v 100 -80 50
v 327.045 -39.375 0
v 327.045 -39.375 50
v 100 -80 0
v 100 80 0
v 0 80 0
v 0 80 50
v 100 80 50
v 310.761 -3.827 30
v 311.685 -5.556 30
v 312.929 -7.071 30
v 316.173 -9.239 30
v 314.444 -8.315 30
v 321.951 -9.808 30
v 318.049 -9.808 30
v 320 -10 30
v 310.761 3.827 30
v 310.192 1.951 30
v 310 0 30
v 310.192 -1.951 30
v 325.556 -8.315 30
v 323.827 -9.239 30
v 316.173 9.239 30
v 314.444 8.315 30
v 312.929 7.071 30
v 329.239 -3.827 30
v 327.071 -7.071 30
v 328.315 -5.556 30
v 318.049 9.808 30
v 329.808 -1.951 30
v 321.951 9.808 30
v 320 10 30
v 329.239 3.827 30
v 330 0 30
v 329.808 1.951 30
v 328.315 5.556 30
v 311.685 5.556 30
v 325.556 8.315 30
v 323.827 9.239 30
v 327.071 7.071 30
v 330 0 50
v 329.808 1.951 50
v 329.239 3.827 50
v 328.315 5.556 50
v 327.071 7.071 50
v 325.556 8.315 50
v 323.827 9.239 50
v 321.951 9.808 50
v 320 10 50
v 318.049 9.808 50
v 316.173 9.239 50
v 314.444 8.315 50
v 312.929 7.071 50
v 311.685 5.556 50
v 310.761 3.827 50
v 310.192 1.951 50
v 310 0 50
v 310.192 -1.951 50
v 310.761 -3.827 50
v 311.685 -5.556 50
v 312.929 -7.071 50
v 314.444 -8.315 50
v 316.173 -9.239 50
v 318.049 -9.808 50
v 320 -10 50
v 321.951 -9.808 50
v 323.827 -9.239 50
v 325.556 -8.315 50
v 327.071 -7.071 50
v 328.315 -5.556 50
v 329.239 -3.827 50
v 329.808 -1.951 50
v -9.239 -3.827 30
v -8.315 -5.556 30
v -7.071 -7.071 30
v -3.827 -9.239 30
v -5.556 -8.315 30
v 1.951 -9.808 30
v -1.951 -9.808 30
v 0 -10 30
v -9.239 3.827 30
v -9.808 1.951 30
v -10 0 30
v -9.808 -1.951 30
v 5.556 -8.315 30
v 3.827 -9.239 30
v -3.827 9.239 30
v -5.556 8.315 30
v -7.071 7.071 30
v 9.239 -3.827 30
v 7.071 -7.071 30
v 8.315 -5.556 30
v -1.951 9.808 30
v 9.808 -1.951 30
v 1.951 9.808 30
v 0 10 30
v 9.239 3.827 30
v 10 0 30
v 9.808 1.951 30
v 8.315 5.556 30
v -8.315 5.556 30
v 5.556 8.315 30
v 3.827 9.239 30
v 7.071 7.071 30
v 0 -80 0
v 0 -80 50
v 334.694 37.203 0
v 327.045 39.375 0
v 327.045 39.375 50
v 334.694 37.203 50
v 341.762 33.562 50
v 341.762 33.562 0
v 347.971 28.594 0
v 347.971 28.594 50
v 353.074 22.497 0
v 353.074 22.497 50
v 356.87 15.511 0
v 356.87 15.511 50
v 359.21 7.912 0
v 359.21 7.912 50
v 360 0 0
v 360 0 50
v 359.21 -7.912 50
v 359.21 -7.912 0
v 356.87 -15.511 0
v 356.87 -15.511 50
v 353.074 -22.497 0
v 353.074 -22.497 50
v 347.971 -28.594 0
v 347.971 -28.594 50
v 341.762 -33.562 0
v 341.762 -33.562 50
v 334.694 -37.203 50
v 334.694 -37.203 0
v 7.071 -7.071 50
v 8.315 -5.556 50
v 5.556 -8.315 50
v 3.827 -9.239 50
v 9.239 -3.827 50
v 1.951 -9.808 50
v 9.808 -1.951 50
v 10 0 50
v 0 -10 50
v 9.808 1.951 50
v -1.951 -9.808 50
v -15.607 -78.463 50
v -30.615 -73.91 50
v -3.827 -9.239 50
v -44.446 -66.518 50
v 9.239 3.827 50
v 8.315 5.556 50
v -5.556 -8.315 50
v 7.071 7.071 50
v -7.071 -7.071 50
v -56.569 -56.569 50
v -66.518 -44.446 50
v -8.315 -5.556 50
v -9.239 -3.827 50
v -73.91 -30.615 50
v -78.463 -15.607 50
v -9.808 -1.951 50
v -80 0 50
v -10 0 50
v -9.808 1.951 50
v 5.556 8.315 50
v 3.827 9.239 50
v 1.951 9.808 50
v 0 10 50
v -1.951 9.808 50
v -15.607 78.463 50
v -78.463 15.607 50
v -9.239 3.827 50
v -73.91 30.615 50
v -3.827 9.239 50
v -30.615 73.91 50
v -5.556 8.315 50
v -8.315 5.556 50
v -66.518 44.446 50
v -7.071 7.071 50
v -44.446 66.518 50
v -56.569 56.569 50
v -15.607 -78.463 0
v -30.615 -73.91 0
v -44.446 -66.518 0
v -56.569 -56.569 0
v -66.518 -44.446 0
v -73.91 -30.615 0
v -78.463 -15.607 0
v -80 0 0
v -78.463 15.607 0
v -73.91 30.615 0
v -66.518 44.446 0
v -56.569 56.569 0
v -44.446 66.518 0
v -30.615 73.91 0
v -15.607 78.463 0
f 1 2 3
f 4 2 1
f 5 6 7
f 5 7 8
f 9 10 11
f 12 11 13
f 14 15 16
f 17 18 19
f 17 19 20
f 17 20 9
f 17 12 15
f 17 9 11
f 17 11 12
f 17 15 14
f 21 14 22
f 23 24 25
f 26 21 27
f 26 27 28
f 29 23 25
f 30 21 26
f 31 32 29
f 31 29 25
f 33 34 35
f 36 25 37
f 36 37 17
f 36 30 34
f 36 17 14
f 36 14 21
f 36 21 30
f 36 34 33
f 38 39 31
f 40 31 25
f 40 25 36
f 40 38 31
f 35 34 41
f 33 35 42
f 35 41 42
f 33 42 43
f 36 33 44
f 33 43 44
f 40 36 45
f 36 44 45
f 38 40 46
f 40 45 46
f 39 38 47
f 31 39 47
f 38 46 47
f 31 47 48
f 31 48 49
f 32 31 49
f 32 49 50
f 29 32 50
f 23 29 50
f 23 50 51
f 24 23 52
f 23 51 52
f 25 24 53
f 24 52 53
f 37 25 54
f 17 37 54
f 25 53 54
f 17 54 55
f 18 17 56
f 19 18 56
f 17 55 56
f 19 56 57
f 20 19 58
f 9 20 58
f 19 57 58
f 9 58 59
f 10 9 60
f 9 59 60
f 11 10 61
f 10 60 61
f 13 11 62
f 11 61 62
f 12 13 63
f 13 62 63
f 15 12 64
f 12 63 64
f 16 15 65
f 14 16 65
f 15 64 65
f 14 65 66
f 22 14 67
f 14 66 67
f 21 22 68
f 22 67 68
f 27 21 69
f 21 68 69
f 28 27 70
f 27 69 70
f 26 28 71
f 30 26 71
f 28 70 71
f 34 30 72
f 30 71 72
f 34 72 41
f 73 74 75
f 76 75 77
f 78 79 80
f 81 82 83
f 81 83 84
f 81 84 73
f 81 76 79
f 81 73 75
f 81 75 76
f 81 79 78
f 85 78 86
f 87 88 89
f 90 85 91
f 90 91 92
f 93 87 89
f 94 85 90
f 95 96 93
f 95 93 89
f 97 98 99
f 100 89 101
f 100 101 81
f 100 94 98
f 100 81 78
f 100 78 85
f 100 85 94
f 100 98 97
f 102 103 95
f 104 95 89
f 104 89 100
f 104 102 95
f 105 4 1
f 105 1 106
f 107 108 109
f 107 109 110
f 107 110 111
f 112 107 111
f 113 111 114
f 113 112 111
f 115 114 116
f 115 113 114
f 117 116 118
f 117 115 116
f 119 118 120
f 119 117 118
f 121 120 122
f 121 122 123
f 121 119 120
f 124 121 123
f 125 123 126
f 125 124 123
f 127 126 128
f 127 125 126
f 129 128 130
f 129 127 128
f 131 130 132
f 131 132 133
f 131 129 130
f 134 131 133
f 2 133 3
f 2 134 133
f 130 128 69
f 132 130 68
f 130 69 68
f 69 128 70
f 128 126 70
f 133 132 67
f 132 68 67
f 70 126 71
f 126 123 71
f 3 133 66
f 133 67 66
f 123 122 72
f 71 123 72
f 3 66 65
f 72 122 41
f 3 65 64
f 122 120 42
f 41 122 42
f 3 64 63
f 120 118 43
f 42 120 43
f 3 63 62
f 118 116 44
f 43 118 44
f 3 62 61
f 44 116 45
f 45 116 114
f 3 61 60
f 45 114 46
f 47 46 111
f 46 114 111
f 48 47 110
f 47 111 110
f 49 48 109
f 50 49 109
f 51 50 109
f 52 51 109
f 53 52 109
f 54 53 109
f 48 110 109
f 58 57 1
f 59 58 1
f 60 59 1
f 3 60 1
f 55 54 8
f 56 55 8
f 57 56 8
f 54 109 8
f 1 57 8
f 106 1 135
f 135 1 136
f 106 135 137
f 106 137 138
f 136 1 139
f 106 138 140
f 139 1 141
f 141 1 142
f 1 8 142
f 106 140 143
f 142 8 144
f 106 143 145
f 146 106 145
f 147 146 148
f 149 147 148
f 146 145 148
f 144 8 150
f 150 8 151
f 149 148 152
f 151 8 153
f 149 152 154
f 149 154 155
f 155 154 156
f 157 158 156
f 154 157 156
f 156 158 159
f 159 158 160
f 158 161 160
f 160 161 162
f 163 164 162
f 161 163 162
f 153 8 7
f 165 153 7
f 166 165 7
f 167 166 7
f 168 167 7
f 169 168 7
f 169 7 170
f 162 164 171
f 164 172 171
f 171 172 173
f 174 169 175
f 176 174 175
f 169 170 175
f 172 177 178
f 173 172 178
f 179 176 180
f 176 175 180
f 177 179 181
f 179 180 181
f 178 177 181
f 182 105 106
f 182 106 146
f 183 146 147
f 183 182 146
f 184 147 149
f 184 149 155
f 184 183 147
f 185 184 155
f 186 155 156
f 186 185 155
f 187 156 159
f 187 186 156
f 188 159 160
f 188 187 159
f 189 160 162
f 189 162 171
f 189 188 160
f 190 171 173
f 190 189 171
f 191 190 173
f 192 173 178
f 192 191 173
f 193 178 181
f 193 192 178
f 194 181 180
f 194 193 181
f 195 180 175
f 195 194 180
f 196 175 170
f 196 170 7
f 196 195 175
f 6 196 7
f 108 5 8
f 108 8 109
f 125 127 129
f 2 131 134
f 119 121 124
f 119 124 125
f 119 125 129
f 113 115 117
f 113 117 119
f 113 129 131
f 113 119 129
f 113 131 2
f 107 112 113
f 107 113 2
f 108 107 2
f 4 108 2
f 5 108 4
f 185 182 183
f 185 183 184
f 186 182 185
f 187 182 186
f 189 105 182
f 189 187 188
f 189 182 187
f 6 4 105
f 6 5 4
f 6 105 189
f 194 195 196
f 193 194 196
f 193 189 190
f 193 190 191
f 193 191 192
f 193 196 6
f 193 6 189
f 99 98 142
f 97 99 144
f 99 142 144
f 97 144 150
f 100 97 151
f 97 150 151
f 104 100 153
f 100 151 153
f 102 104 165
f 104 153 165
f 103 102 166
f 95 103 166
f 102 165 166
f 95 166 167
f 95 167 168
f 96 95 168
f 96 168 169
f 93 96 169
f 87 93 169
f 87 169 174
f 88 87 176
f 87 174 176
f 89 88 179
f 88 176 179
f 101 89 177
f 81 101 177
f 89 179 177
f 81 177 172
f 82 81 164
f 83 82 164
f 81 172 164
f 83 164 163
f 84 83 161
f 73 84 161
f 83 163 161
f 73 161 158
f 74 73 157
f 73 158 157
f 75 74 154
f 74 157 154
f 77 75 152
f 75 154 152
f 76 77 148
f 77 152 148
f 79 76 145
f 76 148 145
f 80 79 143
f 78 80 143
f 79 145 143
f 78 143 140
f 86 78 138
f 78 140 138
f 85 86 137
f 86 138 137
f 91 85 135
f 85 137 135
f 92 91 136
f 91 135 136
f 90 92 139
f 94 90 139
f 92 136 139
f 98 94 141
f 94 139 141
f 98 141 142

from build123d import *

# Parameters (mm, degrees)
BOSS_EXTRUDE1_DEPTH = 50
SKETCH2_R           = 10
CUT_EXTRUDE1_DEPTH  = 20


with BuildPart() as part:
    # Sketch1 → Boss-Extrude1 (new body)
    with BuildSketch(Plane.XY):
        with BuildLine():
            Line((0, 80), (100, 80))
            Line((100, 80), (327.045328578, 39.374653589))
            ThreePointArc((327.045328578, 39.374653589), (360, 0), (327.045328578, -39.374653589))
            Line((327.045328578, -39.374653589), (100, -80))
            Line((100, -80), (0, -80))
            ThreePointArc((0, -80), (-80, 0), (0, 80))
        make_face()
    extrude(amount=BOSS_EXTRUDE1_DEPTH)

    # Sketch2 → Cut-Extrude1 (cut)
    with BuildSketch(Plane.XY.offset(50)):
        Circle(SKETCH2_R)
        with Locations((320, 0)):
            Circle(SKETCH2_R)
    extrude(amount=-CUT_EXTRUDE1_DEPTH, mode=Mode.SUBTRACT)


solid = part.part
